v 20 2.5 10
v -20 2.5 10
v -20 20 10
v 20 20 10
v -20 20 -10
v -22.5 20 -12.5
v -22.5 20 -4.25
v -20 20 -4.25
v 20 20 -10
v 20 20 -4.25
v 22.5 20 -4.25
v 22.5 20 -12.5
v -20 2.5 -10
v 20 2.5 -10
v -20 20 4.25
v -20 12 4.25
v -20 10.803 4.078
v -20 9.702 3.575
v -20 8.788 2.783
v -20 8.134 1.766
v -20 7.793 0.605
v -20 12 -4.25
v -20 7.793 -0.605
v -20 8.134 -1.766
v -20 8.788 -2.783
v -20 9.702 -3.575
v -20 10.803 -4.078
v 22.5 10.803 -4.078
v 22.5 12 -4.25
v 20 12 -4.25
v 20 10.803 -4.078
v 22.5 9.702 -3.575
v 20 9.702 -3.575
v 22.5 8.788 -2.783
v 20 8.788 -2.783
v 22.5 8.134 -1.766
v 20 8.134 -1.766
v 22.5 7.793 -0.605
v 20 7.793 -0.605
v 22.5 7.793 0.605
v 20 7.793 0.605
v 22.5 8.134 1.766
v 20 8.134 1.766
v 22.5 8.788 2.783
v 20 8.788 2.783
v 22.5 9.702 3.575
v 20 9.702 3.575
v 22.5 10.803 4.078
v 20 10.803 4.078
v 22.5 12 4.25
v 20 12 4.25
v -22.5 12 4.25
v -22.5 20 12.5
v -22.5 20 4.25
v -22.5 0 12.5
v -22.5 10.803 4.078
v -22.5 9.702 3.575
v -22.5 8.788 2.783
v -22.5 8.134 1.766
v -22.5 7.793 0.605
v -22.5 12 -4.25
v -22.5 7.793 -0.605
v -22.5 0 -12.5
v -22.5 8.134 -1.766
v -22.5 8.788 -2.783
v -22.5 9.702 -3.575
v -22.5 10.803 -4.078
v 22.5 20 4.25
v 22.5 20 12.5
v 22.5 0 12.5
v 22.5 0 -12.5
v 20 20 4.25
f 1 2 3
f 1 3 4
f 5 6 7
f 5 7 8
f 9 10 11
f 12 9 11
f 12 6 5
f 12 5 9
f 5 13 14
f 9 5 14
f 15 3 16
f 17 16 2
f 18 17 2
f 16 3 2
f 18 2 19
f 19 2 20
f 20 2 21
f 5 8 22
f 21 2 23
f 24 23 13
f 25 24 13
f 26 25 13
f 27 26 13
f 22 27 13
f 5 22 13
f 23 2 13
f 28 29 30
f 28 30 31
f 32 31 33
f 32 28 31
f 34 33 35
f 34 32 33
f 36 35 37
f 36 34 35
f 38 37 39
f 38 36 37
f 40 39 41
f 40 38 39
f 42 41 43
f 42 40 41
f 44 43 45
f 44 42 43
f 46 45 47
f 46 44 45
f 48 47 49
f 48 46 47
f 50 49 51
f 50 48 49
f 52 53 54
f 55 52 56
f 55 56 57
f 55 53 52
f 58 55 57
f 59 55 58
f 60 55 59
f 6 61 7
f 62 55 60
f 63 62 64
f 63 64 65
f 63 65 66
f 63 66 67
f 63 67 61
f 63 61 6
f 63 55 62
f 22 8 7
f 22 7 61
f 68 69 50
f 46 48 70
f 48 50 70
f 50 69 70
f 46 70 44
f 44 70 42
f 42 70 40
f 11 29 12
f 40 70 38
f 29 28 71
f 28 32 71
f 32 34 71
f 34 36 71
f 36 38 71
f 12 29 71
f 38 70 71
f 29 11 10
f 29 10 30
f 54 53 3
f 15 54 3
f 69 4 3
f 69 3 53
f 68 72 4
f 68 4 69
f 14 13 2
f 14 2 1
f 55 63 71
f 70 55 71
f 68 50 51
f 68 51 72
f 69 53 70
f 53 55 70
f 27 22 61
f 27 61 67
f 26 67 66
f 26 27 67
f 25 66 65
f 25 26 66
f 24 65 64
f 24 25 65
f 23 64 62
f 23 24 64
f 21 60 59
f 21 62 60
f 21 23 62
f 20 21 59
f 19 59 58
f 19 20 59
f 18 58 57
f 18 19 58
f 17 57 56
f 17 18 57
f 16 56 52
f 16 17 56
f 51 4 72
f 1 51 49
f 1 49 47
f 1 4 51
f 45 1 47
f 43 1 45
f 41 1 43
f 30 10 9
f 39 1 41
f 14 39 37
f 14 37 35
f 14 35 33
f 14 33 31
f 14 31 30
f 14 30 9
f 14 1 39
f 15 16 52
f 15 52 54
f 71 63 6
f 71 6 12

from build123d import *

# Parameters (mm, degrees)
SKETCH1_W           = 45
SKETCH1_H           = 25
BOSS_EXTRUDE1_DEPTH = 2.5
SKETCH2_W           = 45
SKETCH2_H           = 25
SKETCH2_W_2         = 40
SKETCH2_H_2         = 20
BOSS_EXTRUDE2_DEPTH = 17.5
CUT_EXTRUDE1_DEPTH  = 46


with BuildPart() as part:
    # Sketch1 → Boss-Extrude1 (new body)
    with BuildSketch(Plane(origin=(0, 0, 0), x_dir=(1, 0, 0), z_dir=(0, 1, 0))):
        Rectangle(SKETCH1_W, SKETCH1_H)
    extrude(amount=BOSS_EXTRUDE1_DEPTH)

    # Sketch2 → Boss-Extrude2 (add)
    with BuildSketch(Plane(origin=(0, 2.5, 0), x_dir=(1, 0, 0), z_dir=(0, 1, 0))):
        Rectangle(SKETCH2_W, SKETCH2_H)
        Rectangle(SKETCH2_W_2, SKETCH2_H_2, mode=Mode.SUBTRACT)
    extrude(amount=BOSS_EXTRUDE2_DEPTH)

    # Sketch3 → Cut-Extrude1 (cut, through all)
    with BuildSketch(Plane(origin=(22.5, 0, 0), x_dir=(0, 0, -1), z_dir=(1, 0, 0))):
        with BuildLine():
            Line((-4.25, 12), (-4.25, 20))
            Line((-4.25, 20), (4.25, 20))
            Line((4.25, 20), (4.25, 12))
            ThreePointArc((4.25, 12), (0, 7.75), (-4.25, 12))
        make_face()
    extrude(amount=-CUT_EXTRUDE1_DEPTH, mode=Mode.SUBTRACT)


solid = part.part
